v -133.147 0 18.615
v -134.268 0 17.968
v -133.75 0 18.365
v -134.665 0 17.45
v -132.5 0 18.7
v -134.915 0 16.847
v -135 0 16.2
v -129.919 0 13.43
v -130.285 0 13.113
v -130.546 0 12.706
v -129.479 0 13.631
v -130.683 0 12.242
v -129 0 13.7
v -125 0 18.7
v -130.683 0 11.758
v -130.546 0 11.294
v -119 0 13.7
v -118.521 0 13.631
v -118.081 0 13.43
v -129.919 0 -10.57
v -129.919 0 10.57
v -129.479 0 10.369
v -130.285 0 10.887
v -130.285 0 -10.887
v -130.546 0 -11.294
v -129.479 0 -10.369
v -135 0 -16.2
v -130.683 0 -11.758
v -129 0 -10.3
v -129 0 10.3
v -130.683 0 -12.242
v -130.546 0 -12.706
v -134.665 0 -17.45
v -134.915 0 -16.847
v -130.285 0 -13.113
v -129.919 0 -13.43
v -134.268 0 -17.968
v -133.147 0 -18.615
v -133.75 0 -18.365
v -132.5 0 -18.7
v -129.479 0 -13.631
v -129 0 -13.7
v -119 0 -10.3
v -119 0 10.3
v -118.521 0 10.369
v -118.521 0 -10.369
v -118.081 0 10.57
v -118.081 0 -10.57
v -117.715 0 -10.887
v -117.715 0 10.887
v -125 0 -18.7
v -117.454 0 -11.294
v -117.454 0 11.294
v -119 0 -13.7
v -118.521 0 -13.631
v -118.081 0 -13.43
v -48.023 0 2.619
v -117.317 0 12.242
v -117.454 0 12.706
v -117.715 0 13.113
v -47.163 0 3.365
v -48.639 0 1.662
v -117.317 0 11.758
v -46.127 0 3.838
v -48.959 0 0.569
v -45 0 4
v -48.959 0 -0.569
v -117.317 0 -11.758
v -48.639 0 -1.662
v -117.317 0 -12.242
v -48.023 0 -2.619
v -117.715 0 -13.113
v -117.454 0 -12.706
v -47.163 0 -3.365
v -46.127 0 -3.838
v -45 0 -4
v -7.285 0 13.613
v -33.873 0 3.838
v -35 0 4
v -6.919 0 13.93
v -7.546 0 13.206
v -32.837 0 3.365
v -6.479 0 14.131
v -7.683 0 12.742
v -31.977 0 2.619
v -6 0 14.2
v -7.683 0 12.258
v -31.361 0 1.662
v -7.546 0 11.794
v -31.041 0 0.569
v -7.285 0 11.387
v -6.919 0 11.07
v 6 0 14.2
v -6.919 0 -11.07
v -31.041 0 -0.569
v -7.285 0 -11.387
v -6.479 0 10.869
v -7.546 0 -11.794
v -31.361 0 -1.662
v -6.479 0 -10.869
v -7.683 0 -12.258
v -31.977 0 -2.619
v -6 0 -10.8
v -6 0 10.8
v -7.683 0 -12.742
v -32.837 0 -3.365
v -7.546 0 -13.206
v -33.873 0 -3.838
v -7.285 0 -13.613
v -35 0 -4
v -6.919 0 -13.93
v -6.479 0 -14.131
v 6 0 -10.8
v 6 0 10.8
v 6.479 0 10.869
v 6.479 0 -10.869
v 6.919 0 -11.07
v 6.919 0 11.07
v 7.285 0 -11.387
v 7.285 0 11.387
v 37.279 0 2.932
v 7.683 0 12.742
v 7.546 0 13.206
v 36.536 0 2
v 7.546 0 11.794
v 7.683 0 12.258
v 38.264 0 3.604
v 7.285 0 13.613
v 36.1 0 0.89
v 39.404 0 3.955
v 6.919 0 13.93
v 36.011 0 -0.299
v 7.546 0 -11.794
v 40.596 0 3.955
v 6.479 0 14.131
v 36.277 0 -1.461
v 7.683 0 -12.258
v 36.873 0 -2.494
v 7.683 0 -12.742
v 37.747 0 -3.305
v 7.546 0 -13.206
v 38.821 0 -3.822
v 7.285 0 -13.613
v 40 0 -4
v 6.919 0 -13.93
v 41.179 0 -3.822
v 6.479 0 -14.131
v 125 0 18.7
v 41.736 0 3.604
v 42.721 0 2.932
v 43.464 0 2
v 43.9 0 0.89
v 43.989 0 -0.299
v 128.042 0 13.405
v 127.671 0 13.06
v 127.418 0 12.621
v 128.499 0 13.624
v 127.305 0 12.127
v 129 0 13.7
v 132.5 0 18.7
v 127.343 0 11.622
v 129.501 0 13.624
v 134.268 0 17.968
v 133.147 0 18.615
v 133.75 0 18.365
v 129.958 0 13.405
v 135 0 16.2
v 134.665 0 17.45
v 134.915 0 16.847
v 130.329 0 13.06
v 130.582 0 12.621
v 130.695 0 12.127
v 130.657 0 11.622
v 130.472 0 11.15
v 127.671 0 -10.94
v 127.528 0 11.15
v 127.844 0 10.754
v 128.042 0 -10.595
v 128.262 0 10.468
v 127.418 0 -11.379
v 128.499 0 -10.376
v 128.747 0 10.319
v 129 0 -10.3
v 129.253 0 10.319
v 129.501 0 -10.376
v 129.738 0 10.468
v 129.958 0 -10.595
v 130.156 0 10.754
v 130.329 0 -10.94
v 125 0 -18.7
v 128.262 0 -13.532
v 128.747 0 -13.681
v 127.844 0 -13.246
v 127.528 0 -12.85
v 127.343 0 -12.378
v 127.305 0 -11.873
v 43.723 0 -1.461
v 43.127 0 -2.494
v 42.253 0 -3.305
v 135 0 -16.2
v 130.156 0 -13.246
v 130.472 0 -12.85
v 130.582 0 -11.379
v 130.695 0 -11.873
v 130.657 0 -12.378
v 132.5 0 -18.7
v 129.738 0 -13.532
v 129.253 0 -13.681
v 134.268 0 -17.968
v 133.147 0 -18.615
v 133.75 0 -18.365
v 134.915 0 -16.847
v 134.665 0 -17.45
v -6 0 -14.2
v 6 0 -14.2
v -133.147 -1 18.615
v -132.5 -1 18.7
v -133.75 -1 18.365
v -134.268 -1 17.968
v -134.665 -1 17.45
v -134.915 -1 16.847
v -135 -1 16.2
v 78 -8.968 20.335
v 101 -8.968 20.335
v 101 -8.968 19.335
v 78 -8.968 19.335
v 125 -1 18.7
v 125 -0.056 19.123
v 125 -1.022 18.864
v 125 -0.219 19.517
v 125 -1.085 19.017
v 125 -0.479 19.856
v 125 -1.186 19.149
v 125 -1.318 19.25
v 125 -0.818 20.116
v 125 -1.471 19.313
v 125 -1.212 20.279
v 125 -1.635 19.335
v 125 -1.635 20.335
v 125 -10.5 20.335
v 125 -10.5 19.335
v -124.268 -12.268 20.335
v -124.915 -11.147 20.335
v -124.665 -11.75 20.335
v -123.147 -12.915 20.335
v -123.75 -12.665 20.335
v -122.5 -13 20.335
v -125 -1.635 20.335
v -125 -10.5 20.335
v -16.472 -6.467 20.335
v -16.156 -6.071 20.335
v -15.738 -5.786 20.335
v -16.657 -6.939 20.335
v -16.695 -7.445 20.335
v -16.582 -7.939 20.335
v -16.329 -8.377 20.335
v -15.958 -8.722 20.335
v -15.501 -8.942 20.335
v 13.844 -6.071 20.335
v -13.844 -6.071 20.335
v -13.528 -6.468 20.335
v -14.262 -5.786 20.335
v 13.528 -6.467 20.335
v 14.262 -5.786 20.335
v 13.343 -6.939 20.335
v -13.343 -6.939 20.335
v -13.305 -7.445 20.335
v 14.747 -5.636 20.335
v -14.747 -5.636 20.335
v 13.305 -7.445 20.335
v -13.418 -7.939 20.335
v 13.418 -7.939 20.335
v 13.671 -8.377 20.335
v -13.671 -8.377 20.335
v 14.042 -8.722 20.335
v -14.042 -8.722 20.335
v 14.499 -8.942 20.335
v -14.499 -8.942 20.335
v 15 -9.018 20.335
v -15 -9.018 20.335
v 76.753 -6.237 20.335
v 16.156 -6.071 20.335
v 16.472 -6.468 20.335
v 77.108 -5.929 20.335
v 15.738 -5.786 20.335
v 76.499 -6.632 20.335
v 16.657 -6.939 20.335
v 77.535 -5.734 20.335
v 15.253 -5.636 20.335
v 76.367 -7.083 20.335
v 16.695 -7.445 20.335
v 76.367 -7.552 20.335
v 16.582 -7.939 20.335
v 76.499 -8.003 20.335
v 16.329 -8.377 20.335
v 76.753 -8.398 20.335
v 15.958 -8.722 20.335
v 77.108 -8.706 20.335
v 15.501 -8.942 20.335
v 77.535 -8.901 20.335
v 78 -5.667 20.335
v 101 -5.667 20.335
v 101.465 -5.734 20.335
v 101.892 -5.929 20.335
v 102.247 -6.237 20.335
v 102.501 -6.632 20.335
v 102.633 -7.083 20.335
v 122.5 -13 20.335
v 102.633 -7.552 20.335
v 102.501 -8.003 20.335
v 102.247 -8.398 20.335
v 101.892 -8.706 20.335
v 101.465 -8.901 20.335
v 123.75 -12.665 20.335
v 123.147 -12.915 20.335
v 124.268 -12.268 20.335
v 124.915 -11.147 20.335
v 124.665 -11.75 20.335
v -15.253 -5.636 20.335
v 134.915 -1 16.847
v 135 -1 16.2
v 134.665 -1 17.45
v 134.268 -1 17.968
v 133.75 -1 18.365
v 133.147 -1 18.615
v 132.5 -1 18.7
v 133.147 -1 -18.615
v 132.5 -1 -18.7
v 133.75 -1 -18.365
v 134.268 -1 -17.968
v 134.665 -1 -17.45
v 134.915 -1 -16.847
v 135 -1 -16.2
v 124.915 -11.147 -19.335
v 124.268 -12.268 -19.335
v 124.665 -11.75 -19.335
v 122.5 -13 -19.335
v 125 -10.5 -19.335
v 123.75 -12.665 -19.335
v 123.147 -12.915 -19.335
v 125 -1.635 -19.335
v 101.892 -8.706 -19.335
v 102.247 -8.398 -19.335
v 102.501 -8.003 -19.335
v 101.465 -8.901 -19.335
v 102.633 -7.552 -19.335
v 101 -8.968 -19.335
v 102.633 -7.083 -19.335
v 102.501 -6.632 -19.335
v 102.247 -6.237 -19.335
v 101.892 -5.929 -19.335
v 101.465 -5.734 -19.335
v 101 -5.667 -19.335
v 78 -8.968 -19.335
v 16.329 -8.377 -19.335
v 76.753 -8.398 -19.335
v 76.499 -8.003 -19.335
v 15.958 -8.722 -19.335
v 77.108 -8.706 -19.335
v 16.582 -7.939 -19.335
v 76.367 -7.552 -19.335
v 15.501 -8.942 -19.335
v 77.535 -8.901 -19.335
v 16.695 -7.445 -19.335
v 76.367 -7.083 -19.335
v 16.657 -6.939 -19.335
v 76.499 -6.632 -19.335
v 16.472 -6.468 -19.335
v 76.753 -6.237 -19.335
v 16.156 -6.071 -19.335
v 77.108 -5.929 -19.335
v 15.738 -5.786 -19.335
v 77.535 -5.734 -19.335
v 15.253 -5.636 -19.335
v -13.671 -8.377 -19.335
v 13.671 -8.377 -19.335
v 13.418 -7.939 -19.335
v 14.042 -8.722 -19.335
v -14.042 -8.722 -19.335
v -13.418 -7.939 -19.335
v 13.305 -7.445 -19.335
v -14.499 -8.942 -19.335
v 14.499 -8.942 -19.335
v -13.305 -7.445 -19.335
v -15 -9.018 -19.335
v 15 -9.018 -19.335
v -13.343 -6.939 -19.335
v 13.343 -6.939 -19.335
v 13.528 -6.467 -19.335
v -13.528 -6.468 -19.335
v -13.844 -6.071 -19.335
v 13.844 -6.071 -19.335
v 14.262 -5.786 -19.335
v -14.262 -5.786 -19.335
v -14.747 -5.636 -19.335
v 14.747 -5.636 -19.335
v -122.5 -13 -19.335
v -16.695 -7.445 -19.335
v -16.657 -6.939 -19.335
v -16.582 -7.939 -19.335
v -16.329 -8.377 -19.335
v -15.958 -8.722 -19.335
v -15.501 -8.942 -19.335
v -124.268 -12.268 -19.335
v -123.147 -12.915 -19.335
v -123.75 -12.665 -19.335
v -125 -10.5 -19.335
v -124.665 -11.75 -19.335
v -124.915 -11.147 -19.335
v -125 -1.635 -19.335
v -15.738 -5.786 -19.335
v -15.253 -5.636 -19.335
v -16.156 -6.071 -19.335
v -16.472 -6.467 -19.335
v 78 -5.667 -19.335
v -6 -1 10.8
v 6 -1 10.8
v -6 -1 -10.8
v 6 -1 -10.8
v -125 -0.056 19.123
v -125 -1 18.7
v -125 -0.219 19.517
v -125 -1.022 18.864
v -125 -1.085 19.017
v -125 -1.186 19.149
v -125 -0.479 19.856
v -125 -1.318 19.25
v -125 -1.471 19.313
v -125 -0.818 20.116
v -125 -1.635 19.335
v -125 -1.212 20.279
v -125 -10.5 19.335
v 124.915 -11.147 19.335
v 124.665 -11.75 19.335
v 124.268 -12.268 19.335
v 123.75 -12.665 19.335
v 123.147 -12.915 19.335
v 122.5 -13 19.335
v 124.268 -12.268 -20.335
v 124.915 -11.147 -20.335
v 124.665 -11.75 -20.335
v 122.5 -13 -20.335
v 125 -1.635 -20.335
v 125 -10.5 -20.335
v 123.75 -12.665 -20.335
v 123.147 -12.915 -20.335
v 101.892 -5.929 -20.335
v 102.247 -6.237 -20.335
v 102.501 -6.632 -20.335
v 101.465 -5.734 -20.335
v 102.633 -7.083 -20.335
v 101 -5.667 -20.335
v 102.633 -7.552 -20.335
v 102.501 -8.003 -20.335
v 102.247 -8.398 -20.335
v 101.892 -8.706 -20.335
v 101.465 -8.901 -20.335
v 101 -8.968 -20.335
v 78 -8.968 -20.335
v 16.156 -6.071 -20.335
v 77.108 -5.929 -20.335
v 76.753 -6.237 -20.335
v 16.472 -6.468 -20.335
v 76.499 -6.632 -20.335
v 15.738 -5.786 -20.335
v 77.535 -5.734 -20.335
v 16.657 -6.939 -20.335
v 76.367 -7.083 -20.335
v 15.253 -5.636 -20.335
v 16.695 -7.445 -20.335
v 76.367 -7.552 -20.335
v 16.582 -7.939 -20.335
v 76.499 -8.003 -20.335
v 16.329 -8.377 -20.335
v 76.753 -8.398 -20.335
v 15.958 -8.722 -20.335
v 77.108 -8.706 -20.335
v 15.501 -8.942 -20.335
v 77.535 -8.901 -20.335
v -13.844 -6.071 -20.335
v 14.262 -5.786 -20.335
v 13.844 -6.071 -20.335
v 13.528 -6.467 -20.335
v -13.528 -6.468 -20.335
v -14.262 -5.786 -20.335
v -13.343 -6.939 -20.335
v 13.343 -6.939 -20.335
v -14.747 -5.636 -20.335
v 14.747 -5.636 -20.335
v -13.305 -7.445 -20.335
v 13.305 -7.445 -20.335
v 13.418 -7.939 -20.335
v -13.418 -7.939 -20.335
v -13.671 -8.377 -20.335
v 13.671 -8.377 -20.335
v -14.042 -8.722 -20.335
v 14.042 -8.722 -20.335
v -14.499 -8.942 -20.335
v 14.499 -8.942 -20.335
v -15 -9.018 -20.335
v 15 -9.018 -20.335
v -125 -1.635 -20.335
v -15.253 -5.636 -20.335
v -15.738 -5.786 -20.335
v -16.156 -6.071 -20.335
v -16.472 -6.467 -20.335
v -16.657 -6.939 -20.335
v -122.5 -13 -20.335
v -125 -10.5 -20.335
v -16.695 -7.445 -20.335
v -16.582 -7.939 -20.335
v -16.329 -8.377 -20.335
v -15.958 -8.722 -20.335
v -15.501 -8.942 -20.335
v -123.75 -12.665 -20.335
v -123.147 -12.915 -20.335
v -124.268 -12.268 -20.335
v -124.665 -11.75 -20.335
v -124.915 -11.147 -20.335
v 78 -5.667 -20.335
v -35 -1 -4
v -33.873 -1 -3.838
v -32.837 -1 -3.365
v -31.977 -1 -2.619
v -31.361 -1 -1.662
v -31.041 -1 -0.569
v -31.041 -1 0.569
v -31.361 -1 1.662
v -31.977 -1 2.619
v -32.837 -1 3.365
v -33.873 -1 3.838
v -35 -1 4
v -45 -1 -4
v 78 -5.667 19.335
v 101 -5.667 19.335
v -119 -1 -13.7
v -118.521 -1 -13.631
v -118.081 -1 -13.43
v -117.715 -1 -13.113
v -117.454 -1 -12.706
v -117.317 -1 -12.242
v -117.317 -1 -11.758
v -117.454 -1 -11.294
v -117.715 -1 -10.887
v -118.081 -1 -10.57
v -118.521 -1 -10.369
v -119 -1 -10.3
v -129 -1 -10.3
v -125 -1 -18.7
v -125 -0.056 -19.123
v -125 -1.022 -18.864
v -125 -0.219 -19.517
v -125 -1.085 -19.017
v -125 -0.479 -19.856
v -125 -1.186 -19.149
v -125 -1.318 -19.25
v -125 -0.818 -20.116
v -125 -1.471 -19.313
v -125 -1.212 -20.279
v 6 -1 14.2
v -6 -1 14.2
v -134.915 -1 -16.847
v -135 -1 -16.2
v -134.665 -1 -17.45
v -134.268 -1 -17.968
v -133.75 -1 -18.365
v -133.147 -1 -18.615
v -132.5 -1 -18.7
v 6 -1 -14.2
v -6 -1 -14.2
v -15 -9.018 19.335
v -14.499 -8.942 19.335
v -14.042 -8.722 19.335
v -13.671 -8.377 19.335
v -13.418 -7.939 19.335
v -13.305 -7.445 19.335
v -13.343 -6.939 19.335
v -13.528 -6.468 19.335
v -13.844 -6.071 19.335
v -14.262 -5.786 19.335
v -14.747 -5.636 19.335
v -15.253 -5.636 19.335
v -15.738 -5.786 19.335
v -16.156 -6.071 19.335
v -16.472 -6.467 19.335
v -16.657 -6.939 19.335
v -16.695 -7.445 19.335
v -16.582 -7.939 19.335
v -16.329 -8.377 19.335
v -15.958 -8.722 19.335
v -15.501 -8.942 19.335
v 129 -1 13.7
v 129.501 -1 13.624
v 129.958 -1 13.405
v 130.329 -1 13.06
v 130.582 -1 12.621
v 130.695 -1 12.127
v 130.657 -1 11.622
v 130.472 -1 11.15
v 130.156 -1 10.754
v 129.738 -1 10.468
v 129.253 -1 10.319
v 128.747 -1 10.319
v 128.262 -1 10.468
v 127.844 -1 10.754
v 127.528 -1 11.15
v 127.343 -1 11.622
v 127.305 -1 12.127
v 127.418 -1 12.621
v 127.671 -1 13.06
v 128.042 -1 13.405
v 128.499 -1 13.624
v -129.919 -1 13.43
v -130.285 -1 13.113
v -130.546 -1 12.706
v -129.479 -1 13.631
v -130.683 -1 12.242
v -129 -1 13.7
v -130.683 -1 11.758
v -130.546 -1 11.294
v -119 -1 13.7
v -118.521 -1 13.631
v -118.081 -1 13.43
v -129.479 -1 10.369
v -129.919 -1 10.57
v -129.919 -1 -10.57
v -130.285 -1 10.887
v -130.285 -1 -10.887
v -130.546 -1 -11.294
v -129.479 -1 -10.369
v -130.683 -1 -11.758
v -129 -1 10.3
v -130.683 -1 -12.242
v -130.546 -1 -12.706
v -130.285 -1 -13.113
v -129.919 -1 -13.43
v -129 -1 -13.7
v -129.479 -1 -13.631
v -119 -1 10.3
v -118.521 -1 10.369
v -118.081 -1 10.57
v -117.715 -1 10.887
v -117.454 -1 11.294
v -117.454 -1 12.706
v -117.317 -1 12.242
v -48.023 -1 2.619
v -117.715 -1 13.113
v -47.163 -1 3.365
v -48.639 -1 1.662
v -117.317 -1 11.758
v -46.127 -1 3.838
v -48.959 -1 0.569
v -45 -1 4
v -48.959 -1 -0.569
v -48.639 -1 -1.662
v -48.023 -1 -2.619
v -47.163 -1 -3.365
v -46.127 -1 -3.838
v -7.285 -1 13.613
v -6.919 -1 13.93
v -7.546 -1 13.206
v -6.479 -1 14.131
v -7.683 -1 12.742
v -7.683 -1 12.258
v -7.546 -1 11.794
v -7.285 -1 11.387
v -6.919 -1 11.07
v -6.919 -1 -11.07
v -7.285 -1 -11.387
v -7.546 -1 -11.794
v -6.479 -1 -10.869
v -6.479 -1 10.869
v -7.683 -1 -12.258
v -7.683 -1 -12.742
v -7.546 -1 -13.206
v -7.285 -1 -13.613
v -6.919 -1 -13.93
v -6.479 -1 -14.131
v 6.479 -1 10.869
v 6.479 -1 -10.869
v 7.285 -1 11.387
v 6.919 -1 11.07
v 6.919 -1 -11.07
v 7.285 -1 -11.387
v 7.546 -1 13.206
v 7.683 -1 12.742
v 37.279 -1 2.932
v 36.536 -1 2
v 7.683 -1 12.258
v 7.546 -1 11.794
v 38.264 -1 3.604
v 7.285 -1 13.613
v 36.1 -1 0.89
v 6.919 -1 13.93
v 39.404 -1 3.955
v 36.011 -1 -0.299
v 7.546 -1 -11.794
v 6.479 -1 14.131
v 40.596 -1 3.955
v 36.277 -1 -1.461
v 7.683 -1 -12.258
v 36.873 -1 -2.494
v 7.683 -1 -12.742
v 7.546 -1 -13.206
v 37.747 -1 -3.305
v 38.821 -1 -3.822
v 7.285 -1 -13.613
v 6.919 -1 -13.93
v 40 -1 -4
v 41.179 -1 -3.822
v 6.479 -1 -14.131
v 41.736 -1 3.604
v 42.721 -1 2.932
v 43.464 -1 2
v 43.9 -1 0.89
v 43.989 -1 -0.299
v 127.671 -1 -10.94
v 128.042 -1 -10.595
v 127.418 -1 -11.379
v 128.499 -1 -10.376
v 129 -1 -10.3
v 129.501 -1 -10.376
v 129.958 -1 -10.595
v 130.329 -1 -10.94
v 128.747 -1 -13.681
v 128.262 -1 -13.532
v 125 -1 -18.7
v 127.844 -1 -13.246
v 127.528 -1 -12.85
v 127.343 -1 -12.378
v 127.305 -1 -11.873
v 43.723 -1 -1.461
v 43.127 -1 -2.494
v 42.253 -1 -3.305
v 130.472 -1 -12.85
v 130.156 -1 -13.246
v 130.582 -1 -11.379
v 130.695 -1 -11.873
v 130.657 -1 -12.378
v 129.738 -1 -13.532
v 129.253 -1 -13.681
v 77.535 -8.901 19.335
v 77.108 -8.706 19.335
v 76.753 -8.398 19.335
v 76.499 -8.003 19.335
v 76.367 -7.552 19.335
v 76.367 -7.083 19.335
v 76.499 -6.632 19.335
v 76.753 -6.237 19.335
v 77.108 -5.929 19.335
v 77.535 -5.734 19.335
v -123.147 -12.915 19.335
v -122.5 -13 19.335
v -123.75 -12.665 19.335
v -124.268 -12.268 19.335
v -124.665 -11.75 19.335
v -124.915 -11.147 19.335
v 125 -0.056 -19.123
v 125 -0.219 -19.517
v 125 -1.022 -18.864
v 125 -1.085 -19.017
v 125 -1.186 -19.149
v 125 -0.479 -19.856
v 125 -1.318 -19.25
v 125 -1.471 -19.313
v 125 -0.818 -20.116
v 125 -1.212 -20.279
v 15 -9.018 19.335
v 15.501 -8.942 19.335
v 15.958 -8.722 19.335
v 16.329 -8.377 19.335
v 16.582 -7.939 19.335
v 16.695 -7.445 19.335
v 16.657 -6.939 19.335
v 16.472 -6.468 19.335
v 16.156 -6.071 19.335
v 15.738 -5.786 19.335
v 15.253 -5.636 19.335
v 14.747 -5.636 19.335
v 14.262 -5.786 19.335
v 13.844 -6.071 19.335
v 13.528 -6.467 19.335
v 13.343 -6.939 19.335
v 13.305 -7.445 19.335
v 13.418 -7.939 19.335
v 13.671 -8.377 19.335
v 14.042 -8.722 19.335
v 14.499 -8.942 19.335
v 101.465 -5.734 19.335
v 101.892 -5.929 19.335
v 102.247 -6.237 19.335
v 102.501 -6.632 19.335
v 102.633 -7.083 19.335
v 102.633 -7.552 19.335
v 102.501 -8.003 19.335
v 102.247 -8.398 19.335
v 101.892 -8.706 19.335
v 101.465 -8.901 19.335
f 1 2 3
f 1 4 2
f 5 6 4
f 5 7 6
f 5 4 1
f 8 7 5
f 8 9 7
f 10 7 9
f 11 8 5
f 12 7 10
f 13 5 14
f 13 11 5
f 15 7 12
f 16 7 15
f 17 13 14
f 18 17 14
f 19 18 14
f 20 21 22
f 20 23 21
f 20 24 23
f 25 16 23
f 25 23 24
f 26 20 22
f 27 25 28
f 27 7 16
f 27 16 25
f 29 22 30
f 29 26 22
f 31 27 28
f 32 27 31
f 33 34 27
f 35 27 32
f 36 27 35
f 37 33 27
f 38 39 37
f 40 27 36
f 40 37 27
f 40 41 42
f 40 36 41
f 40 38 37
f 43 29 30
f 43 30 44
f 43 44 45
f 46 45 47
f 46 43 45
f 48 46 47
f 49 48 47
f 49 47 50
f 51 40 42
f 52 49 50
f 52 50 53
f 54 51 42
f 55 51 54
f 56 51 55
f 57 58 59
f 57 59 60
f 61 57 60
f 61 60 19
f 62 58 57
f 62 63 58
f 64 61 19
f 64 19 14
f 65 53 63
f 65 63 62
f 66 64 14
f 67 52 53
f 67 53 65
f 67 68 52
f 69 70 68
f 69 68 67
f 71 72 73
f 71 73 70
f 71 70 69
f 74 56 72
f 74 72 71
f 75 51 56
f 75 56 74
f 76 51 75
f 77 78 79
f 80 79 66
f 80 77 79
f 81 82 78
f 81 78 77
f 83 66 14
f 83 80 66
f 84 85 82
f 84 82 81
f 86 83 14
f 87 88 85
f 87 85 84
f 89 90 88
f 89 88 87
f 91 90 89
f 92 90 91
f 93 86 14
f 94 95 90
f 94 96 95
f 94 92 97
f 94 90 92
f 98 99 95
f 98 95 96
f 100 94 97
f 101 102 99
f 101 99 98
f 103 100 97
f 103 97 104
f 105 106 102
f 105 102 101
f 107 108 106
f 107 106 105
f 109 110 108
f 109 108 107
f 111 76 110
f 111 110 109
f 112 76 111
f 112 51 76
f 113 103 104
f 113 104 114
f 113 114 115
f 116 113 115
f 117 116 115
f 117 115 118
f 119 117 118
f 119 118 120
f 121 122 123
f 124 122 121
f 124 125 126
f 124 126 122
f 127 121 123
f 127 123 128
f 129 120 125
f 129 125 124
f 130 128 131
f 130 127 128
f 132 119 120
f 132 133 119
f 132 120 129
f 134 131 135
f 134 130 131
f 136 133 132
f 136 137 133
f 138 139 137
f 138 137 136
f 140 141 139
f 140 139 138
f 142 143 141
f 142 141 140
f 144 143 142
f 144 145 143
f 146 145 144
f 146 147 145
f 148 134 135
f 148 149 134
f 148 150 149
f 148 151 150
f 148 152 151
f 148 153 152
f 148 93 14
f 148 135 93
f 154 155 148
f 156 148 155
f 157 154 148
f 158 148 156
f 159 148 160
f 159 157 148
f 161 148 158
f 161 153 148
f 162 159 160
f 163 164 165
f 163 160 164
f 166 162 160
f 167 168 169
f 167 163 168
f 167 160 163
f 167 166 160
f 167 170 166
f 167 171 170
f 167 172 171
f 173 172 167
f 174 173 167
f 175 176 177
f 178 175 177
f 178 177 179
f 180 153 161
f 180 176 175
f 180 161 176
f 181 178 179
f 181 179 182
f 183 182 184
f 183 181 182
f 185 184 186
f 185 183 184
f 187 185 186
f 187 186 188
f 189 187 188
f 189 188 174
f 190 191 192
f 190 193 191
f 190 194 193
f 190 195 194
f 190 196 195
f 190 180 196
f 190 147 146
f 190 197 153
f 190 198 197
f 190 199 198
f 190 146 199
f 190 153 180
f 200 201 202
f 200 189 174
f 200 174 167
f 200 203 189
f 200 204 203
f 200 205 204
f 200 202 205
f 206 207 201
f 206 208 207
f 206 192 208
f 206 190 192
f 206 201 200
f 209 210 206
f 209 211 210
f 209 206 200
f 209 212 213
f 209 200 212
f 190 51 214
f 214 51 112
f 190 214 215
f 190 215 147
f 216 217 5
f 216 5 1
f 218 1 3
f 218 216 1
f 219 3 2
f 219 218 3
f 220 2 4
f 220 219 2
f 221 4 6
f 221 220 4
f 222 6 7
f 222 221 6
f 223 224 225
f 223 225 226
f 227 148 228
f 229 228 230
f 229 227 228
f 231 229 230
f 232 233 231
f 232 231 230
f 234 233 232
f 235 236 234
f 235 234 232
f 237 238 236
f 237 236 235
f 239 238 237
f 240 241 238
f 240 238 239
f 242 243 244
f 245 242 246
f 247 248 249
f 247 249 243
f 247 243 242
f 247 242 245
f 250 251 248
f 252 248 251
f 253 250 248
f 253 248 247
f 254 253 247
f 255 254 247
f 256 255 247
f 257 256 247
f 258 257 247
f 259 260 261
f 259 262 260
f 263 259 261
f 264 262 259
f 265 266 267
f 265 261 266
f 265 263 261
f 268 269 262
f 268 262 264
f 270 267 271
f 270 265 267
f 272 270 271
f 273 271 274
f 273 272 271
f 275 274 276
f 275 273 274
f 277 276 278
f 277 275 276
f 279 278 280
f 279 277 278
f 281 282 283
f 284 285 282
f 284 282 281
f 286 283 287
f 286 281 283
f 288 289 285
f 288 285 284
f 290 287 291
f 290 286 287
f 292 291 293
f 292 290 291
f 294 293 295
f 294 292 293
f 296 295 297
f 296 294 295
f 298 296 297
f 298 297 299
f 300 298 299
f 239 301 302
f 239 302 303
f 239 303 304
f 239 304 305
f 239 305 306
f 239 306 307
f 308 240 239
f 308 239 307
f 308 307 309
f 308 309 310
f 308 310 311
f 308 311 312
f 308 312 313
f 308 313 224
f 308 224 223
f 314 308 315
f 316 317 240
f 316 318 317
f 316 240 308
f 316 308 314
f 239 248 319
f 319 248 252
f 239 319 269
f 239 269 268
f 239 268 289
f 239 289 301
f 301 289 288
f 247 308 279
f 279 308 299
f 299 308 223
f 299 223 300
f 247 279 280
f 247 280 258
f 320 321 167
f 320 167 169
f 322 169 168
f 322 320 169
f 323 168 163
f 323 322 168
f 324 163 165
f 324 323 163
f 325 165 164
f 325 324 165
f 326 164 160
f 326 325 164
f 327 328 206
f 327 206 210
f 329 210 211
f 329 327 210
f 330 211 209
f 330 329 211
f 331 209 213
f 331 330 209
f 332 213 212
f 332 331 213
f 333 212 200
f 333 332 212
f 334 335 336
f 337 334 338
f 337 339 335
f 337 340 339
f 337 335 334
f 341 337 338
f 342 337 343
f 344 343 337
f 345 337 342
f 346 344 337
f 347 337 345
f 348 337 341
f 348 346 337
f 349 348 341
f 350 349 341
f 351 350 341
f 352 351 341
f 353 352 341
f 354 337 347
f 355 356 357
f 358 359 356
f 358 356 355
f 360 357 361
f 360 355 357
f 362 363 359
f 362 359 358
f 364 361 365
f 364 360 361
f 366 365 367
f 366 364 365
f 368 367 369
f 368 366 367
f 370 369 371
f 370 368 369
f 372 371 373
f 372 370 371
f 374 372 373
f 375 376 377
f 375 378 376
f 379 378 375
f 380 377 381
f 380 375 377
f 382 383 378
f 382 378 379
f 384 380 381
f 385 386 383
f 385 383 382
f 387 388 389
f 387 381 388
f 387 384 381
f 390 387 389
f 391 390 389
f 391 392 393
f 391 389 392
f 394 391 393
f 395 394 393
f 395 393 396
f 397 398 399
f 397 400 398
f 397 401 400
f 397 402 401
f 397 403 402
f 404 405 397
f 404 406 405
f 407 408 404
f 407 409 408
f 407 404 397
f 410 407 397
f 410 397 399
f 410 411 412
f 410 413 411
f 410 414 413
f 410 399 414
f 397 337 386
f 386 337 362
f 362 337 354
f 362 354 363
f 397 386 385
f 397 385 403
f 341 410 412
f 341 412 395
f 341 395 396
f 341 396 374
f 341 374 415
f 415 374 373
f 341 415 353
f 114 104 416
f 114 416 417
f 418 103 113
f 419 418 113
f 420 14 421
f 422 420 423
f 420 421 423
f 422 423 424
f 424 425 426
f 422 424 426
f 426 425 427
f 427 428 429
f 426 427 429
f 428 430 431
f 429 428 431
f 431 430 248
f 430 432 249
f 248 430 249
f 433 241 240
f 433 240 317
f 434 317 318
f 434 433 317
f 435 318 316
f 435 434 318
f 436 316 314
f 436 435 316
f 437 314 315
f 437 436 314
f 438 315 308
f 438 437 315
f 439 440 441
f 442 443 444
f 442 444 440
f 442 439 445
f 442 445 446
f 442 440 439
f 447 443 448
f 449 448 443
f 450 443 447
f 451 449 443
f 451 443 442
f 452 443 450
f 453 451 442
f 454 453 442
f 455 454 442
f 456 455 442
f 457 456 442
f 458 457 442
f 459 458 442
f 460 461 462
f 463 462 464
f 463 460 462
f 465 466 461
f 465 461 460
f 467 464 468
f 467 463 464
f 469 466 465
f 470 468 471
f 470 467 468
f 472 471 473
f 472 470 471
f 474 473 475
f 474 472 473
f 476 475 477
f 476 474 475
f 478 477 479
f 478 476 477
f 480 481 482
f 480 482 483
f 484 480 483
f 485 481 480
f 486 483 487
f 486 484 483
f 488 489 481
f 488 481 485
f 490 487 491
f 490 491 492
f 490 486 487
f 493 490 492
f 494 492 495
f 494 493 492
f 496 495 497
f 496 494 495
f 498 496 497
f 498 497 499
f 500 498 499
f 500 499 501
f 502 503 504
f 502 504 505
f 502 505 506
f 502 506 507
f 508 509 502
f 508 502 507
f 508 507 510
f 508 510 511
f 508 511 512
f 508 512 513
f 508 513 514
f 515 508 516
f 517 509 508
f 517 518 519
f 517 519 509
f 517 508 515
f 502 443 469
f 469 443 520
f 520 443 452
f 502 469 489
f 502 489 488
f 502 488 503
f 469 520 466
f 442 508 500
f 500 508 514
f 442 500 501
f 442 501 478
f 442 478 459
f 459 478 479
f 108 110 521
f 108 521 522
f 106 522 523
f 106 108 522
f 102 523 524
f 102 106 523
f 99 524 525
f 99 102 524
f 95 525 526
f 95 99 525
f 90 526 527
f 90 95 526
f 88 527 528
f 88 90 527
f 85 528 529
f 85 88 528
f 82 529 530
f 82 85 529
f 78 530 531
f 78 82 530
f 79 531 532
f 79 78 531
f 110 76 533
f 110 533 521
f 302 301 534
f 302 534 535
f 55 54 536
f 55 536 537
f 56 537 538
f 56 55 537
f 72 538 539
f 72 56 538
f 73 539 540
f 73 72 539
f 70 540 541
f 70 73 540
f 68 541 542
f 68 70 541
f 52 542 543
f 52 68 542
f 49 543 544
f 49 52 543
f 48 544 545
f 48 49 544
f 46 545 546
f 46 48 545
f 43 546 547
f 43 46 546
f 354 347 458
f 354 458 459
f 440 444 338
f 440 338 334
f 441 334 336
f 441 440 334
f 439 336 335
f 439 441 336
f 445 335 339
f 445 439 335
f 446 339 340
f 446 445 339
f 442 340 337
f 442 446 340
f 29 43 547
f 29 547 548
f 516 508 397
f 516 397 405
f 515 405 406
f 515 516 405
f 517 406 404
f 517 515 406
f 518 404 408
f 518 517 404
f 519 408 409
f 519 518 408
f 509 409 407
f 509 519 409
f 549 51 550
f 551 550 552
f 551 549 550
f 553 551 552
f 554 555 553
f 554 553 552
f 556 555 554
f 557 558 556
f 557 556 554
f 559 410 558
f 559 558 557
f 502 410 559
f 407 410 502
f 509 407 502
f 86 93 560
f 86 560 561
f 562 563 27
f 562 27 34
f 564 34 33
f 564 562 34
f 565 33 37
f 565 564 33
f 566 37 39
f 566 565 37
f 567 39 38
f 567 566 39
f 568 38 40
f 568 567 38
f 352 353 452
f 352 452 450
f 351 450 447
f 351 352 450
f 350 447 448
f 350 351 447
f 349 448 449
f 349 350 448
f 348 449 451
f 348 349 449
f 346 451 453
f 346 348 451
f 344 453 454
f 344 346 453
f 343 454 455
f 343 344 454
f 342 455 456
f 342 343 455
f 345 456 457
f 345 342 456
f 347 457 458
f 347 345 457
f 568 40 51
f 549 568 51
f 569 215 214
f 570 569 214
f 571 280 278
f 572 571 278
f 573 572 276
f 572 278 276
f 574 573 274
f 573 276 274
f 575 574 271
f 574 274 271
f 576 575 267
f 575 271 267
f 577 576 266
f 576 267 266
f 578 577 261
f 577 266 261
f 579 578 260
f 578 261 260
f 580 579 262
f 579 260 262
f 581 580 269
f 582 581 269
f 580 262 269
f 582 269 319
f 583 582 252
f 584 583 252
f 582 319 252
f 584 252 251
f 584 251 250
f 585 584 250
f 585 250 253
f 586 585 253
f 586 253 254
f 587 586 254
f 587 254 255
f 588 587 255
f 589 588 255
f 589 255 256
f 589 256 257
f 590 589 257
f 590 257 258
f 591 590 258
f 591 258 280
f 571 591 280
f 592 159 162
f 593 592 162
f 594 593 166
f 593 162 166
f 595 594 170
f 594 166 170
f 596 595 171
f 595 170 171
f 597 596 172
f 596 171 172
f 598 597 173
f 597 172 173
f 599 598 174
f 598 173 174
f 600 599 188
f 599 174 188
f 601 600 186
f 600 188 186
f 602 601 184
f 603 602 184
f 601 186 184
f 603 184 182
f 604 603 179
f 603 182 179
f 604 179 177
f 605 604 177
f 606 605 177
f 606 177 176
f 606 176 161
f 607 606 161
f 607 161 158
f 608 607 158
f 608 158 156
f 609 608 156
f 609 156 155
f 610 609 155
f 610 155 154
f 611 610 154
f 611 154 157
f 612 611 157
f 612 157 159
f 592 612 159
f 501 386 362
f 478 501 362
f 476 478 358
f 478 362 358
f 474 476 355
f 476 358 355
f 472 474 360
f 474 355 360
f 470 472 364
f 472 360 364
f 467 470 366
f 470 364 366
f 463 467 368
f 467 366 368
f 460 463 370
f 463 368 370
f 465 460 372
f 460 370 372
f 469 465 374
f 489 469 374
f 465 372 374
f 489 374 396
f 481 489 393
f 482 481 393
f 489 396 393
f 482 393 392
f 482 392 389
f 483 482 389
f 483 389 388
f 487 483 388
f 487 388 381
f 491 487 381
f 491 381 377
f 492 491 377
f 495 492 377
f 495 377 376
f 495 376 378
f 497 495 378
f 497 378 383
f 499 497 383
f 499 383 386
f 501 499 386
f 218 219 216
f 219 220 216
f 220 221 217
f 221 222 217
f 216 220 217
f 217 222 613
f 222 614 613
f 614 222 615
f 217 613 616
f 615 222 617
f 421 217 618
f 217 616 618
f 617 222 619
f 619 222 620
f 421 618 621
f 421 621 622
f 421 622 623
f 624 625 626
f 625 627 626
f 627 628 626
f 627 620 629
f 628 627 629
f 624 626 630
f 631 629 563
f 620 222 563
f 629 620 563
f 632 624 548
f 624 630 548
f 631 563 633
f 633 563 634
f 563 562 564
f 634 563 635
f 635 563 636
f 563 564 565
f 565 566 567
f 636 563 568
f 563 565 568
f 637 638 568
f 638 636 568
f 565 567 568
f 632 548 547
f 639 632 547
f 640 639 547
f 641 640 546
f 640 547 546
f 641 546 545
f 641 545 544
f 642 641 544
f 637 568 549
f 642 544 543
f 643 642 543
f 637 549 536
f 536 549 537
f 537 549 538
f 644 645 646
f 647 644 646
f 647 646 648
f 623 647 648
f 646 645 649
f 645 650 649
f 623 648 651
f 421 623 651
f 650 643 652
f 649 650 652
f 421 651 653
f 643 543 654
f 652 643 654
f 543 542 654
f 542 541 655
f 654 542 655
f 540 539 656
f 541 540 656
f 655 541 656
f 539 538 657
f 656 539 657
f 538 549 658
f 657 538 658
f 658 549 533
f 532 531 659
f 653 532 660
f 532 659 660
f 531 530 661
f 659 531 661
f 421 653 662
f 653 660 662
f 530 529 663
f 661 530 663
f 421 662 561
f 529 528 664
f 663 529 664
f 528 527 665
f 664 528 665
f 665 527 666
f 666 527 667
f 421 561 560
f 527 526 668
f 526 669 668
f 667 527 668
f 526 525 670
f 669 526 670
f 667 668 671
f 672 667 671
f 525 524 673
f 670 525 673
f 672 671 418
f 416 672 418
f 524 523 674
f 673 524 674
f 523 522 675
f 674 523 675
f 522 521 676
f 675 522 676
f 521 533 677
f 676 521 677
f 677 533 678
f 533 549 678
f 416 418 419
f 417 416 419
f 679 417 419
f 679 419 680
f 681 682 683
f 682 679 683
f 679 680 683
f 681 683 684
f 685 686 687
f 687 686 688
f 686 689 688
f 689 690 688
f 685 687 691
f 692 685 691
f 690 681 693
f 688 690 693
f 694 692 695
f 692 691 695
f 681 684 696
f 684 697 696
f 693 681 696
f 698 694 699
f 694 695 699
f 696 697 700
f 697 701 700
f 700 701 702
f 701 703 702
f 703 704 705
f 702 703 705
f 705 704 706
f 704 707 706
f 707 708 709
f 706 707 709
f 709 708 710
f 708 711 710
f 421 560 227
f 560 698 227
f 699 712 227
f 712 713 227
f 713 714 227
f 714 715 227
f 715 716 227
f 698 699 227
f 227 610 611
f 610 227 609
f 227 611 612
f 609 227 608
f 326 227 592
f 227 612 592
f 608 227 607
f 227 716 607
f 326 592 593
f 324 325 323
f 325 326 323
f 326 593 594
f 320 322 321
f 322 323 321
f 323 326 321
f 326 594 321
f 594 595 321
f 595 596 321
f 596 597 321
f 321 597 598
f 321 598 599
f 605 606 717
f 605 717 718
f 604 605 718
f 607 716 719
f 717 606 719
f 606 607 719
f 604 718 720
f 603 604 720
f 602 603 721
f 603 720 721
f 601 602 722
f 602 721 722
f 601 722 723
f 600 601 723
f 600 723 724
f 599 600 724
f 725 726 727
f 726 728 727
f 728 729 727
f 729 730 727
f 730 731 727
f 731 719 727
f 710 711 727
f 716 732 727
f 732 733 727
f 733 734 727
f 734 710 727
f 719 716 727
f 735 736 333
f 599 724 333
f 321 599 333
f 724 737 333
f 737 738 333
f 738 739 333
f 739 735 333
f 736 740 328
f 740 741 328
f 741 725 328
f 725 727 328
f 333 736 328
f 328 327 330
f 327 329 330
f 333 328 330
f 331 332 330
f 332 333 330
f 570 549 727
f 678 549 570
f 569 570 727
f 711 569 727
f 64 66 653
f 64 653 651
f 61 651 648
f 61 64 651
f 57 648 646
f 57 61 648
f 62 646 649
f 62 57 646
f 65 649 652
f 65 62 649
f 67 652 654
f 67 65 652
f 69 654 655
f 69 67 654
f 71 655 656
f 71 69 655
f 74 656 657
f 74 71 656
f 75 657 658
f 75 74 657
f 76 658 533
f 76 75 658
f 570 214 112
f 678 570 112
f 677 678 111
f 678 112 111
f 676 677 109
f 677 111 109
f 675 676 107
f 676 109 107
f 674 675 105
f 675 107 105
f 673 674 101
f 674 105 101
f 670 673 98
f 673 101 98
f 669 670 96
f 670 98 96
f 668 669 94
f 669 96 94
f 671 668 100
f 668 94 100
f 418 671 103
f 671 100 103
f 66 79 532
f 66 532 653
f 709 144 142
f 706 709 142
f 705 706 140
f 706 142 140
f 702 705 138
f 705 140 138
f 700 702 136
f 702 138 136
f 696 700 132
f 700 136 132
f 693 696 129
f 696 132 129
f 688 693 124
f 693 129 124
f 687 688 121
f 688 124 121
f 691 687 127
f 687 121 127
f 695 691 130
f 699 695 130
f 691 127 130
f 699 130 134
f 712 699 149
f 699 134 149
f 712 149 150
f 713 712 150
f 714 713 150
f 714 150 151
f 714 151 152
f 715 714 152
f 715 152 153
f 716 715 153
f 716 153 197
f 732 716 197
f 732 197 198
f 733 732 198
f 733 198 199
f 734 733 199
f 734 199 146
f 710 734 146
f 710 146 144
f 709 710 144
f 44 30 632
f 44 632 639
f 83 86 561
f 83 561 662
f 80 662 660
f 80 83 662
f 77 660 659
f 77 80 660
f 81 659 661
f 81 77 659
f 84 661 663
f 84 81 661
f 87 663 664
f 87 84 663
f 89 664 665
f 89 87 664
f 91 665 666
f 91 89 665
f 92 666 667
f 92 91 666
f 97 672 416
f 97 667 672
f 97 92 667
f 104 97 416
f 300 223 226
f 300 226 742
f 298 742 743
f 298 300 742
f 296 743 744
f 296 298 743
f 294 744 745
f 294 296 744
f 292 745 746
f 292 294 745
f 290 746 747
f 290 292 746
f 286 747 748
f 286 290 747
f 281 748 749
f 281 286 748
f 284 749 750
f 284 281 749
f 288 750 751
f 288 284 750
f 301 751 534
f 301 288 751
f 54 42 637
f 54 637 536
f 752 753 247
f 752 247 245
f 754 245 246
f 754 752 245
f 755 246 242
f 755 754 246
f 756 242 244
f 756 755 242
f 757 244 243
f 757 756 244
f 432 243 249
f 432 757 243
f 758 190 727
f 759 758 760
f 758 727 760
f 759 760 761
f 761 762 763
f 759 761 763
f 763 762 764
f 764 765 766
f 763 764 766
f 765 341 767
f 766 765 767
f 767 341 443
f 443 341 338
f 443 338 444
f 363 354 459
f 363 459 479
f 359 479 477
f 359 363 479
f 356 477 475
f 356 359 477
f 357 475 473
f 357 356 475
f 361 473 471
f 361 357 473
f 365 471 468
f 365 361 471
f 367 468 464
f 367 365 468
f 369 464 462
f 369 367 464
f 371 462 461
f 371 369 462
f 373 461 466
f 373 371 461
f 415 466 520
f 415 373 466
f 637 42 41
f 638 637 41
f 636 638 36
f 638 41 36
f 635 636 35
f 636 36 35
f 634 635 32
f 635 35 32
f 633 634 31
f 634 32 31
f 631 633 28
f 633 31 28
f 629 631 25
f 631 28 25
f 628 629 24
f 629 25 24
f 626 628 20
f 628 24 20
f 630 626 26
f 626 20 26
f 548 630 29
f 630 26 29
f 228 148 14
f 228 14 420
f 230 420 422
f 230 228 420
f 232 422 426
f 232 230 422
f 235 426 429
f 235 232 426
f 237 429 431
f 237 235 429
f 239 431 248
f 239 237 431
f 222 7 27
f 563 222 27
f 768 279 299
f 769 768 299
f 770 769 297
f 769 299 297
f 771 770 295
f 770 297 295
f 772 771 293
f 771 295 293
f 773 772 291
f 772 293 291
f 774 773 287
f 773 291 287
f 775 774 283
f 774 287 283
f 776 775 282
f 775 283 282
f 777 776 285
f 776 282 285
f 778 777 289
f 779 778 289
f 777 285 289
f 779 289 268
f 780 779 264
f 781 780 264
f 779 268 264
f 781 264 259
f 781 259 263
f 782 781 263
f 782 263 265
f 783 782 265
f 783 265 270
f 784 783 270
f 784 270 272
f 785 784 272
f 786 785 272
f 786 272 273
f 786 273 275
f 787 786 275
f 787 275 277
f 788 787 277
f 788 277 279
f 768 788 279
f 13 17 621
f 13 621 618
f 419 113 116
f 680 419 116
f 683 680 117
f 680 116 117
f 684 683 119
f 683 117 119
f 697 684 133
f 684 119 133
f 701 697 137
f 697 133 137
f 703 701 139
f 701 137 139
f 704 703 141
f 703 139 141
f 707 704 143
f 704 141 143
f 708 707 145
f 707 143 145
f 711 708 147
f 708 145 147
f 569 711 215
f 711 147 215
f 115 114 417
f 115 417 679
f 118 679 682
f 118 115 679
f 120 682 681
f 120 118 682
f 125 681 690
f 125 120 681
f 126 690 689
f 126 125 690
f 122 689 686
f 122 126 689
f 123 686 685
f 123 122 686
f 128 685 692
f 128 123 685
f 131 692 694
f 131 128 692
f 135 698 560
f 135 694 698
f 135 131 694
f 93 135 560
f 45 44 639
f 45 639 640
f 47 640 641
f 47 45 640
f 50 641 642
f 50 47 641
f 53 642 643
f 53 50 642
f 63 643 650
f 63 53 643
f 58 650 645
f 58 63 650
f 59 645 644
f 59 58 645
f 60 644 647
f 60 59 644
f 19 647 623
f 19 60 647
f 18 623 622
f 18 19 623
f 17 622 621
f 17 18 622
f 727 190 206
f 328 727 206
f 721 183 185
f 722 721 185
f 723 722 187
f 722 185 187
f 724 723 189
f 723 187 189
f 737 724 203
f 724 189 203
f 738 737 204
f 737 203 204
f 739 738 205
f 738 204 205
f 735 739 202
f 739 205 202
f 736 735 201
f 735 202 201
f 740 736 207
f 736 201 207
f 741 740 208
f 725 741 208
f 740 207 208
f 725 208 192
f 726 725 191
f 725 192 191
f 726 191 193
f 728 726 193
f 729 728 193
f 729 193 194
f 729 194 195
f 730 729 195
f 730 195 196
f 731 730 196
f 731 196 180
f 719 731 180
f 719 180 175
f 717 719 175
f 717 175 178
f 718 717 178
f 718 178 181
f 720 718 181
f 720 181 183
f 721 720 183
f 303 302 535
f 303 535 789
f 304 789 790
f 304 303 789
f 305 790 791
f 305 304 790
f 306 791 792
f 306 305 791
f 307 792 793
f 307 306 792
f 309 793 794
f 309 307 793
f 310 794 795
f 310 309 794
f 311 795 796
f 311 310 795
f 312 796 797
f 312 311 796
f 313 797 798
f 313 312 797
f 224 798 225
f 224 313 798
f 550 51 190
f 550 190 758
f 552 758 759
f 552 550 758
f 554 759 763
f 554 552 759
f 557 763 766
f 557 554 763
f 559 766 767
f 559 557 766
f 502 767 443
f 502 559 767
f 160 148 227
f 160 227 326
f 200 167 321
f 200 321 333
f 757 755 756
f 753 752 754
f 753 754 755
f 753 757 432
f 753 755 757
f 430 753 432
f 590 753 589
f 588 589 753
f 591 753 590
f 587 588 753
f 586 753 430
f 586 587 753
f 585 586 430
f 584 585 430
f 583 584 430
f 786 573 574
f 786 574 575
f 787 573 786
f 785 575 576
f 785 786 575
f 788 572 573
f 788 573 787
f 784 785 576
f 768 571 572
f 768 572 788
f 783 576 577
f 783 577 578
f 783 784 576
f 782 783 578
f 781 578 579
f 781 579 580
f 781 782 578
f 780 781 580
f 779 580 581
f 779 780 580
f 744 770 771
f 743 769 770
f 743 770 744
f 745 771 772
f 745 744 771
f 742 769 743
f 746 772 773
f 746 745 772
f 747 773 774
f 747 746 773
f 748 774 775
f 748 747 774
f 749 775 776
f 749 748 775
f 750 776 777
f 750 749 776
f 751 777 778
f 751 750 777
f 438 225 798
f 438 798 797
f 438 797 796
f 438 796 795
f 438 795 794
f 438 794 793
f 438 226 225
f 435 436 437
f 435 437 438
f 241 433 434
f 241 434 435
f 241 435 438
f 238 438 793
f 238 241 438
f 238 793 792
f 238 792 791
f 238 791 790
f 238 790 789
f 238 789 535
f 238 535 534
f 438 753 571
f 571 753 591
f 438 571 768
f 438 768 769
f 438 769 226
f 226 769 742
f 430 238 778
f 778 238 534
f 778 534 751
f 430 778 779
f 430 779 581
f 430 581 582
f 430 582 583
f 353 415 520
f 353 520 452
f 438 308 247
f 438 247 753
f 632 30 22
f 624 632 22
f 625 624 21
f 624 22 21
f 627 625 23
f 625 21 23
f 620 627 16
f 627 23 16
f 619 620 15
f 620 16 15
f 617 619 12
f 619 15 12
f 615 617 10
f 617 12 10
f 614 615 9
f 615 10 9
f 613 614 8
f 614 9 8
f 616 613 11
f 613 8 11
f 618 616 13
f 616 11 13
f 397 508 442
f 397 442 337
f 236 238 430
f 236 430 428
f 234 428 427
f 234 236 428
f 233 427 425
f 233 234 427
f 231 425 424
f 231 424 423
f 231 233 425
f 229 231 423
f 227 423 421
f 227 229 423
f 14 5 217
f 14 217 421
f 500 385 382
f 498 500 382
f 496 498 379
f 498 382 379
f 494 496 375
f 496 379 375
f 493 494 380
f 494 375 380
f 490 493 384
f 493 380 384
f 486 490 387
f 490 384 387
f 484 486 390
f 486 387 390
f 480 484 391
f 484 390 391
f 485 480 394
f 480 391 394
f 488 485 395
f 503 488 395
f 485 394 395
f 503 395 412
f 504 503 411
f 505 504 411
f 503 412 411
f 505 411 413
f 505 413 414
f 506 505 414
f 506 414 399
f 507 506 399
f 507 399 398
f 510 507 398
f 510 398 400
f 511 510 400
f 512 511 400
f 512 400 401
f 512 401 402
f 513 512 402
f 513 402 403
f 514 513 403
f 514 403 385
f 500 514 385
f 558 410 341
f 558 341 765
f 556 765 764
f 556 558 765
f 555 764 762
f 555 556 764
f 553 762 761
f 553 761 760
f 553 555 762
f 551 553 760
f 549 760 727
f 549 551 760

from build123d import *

# Parameters (mm, degrees)
SKETCH1_W               = 270
SKETCH1_H               = 37.4
BASE_FLANGE1_DEPTH      = 1
SKETCH4_R               = 4
CUT_EXTRUDE1_DEPTH      = 137.292663045
CUT_EXTRUDE2_DEPTH      = 1
EDGE_FLANGE1_DEPTH      = 250
EDGE_FLANGE1_BEND_DEPTH = 250
CUT_EXTRUDE3_REACH      = 139.14
SKETCH13_R              = 1.7
CUT_EXTRUDE4_DEPTH      = 142.591132844
BREAK_CORNER1_START     = -20.335
BREAK_CORNER1_DEPTH     = 40.67
BREAK_CORNER1_START_2   = -1
BREAK_CORNER1_2_DEPTH   = 1
CUT_EXTRUDE5_REACH      = 139.14
SKETCH16_R              = 1.7
CUT_EXTRUDE6_DEPTH      = 142.591132844
CUT_EXTRUDE7_DEPTH      = 1


# Read off the part's stored shape, not the designer's step: Break-Corner1
# Sheet-metal steps are written as plain solids
with BuildPart() as part:
    # Sketch1 → Base-Flange1 (new body)
    with BuildSketch(Plane(origin=(0, 0, 0), x_dir=(1, 0, 0), z_dir=(0, 1, 0))):
        Rectangle(SKETCH1_W, SKETCH1_H)
    extrude(amount=-BASE_FLANGE1_DEPTH)

    # Sketch4 → Cut-Extrude1 (cut, through all)
    with BuildSketch(Plane(origin=(0, 0, 0), x_dir=(1, 0, 0), z_dir=(0, 1, 0))):
        with Locations(Location((-40, 0, 0), (0, 0, 270))):
            Circle(SKETCH4_R)
        with Locations(Location((40, 0, 0), (0, 0, 90))):
            Circle(SKETCH4_R)
    extrude(amount=-CUT_EXTRUDE1_DEPTH, mode=Mode.SUBTRACT)

    # Sketch6 → Cut-Extrude2 (cut)
    with BuildSketch(Plane(origin=(0, 0, 0), x_dir=(1, 0, 0), z_dir=(0, 1, 0))):
        with BuildLine():
            Line((-45, 4), (-35, 4))
            ThreePointArc((-35, 4), (-31, 0), (-35, -4))
            Line((-35, -4), (-45, -4))
            ThreePointArc((-45, -4), (-49, 0), (-45, 4))
        make_face()
    extrude(amount=-CUT_EXTRUDE2_DEPTH, mode=Mode.SUBTRACT)

    # Edge-Flange1 section (across the edge) → Edge-Flange1 (add)
    with BuildSketch(Plane(origin=(125, -1, 19.335), x_dir=(0, 0, -1), z_dir=(-1, 0, 0))):
        with BuildLine():
            Line((-1, 0.635), (-1, 12))
            Line((-1, 12), (0, 12))
            Line((0, 12), (0, 0.635))
            ThreePointArc((0, 0.635), (0.185987194, 0.185987194), (0.635, 0))
            Line((0.635, 0), (0.635, -1))
            ThreePointArc((0.635, -1), (-0.521119587, -0.521119587), (-1, 0.635))
        make_face()
    extrude(amount=EDGE_FLANGE1_DEPTH)

    # Edge-Flange1 section 2 (across the edge) → Edge-Flange1 bend (add)
    with BuildSketch(Plane(origin=(-125, -1, -19.335), x_dir=(0, 0, 1), z_dir=(1, 0, 0))):
        with BuildLine():
            Line((-1, 0.635), (-1, 12))
            Line((-1, 12), (0, 12))
            Line((0, 12), (0, 0.635))
            ThreePointArc((0, 0.635), (0.185987194, 0.185987194), (0.635, 0))
            Line((0.635, 0), (0.635, -1))
            ThreePointArc((0.635, -1), (-0.521119587, -0.521119587), (-1, 0.635))
        make_face()
    extrude(amount=EDGE_FLANGE1_BEND_DEPTH)

    # Sketch13 → Cut-Extrude3 (cut, up to next)
    with BuildSketch(Plane(origin=(0, 0, 0), x_dir=(1, 0, 0), z_dir=(0, 1, 0)), mode=Mode.PRIVATE) as cut_extrude3_sk1:
        with Locations(Location((-129, 12, 0), (0, 0, 270))):
            Circle(SKETCH13_R)
    cut_extrude3_tool1 = extrude(cut_extrude3_sk1.sketch, amount=-CUT_EXTRUDE3_REACH, mode=Mode.PRIVATE) & part.part
    # Sketch13 → Cut-Extrude3 (cut, up to next)
    with BuildSketch(Plane(origin=(0, 0, 0), x_dir=(1, 0, 0), z_dir=(0, 1, 0)), mode=Mode.PRIVATE) as cut_extrude3_sk2:
        with Locations(Location((-129, -12, 0), (0, 0, 270))):
            Circle(SKETCH13_R)
    cut_extrude3_tool2 = extrude(cut_extrude3_sk2.sketch, amount=-CUT_EXTRUDE3_REACH, mode=Mode.PRIVATE) & part.part
    # Sketch13 → Cut-Extrude3 (cut, up to next)
    with BuildSketch(Plane(origin=(0, 0, 0), x_dir=(1, 0, 0), z_dir=(0, 1, 0)), mode=Mode.PRIVATE) as cut_extrude3_sk3:
        with Locations(Location((129, -12, 0), (0, 0, 270))):
            Circle(SKETCH13_R)
    cut_extrude3_tool3 = extrude(cut_extrude3_sk3.sketch, amount=-CUT_EXTRUDE3_REACH, mode=Mode.PRIVATE) & part.part
    # Sketch13 → Cut-Extrude3 (cut, up to next)
    with BuildSketch(Plane(origin=(0, 0, 0), x_dir=(1, 0, 0), z_dir=(0, 1, 0)), mode=Mode.PRIVATE) as cut_extrude3_sk4:
        with Locations(Location((129, 12, 0), (0, 0, 270))):
            Circle(SKETCH13_R)
    cut_extrude3_tool4 = extrude(cut_extrude3_sk4.sketch, amount=-CUT_EXTRUDE3_REACH, mode=Mode.PRIVATE) & part.part
    add(cut_extrude3_tool1.solids().sort_by_distance((-129, 0, -12))[0], mode=Mode.SUBTRACT)
    add(cut_extrude3_tool2.solids().sort_by_distance((-129, 0, 12))[0], mode=Mode.SUBTRACT)
    add(cut_extrude3_tool3.solids().sort_by_distance((129, 0, 12))[0], mode=Mode.SUBTRACT)
    add(cut_extrude3_tool4.solids().sort_by_distance((129, 0, -12))[0], mode=Mode.SUBTRACT)

    # Sketch14 → Cut-Extrude4 (cut, through all)
    with BuildSketch(Plane.XY.offset(20.335)):
        with BuildLine():
            Line((78, -5.6675), (101, -5.6675))
            ThreePointArc((101, -5.6675), (102.65, -7.3175), (101, -8.9675))
            Line((101, -8.9675), (78, -8.9675))
            ThreePointArc((78, -8.9675), (76.35, -7.3175), (78, -5.6675))
        make_face()
    extrude(amount=-CUT_EXTRUDE4_DEPTH, mode=Mode.SUBTRACT)

    # Break-Corner1 outline → Break-Corner1 (cut)
    with BuildSketch(Plane.XY.offset(BREAK_CORNER1_START)):
        with BuildLine():
            Line((-125, -13), (-122.5, -13))
            ThreePointArc((-122.5, -13), (-124.267766953, -12.267766953), (-125, -10.5))
            Line((-125, -10.5), (-125, -13))
        make_face()
        with BuildLine():
            ThreePointArc((125, -10.5), (124.267766953, -12.267766953), (122.5, -13))
            Line((122.5, -13), (125, -13))
            Line((125, -13), (125, -10.5))
        make_face()
    extrude(amount=BREAK_CORNER1_DEPTH, mode=Mode.SUBTRACT)

    # Break-Corner1 2 outline → Break-Corner1 2 (cut)
    with BuildSketch(Plane(origin=(0, 0, 0), x_dir=(1, 0, 0), z_dir=(0, 1, 0)).offset(BREAK_CORNER1_START_2)):
        with BuildLine():
            ThreePointArc((132.5, 18.7), (134.267766953, 17.967766953), (135, 16.2))
            Line((135, 16.2), (135, 18.7))
            Line((135, 18.7), (132.5, 18.7))
        make_face()
        with BuildLine():
            ThreePointArc((135, -16.2), (134.267766953, -17.967766953), (132.5, -18.7))
            Line((132.5, -18.7), (135, -18.7))
            Line((135, -18.7), (135, -16.2))
        make_face()
        with BuildLine():
            Line((-135, 18.7), (-135, 16.2))
            ThreePointArc((-135, 16.2), (-134.267766953, 17.967766953), (-132.5, 18.7))
            Line((-132.5, 18.7), (-135, 18.7))
        make_face()
        with BuildLine():
            ThreePointArc((-132.5, -18.7), (-134.267766953, -17.967766953), (-135, -16.2))
            Line((-135, -16.2), (-135, -18.7))
            Line((-135, -18.7), (-132.5, -18.7))
        make_face()
    extrude(amount=BREAK_CORNER1_2_DEPTH, mode=Mode.SUBTRACT)

    # Sketch15 → Cut-Extrude5 (cut, up to next)
    with BuildSketch(Plane(origin=(0, 0, 0), x_dir=(1, 0, 0), z_dir=(0, 1, 0)), mode=Mode.PRIVATE) as cut_extrude5_sk1:
        with BuildLine():
            Line((-6, -10.8), (6, -10.8))
            ThreePointArc((6, -10.8), (7.7, -12.5), (6, -14.2))
            Line((6, -14.2), (-6, -14.2))
            ThreePointArc((-6, -14.2), (-7.7, -12.5), (-6, -10.8))
        make_face()
    cut_extrude5_tool1 = extrude(cut_extrude5_sk1.sketch, amount=-CUT_EXTRUDE5_REACH, mode=Mode.PRIVATE) & part.part
    # Sketch15 → Cut-Extrude5 (cut, up to next)
    with BuildSketch(Plane(origin=(0, 0, 0), x_dir=(1, 0, 0), z_dir=(0, 1, 0)), mode=Mode.PRIVATE) as cut_extrude5_sk2:
        with BuildLine():
            Line((-6, 10.8), (6, 10.8))
            ThreePointArc((6, 10.8), (7.7, 12.5), (6, 14.2))
            Line((6, 14.2), (-6, 14.2))
            ThreePointArc((-6, 14.2), (-7.7, 12.5), (-6, 10.8))
        make_face()
    cut_extrude5_tool2 = extrude(cut_extrude5_sk2.sketch, amount=-CUT_EXTRUDE5_REACH, mode=Mode.PRIVATE) & part.part
    add(cut_extrude5_tool1.solids().sort_by_distance((0, 0, 12.5))[0], mode=Mode.SUBTRACT)
    add(cut_extrude5_tool2.solids().sort_by_distance((0, 0, -12.5))[0], mode=Mode.SUBTRACT)

    # Sketch16 → Cut-Extrude6 (cut, through all)
    with BuildSketch(Plane.XY.offset(20.335)):
        with Locations(Location((15, -7.3175, 0), (0, 0, 270))):
            Circle(SKETCH16_R)
        with Locations(Location((-15, -7.3175, 0), (0, 0, 270))):
            Circle(SKETCH16_R)
    extrude(amount=-CUT_EXTRUDE6_DEPTH, mode=Mode.SUBTRACT)

    # Sketch17 → Cut-Extrude7 (cut)
    with BuildSketch(Plane(origin=(0, 0, 0), x_dir=(1, 0, 0), z_dir=(0, 1, 0))):
        with BuildLine():
            Line((-129, -10.3), (-119, -10.3))
            ThreePointArc((-119, -10.3), (-117.3, -12), (-119, -13.7))
            Line((-119, -13.7), (-129, -13.7))
            ThreePointArc((-129, -13.7), (-130.7, -12), (-129, -10.3))
        make_face()
        with BuildLine():
            Line((-129, 13.7), (-119, 13.7))
            ThreePointArc((-119, 13.7), (-117.3, 12), (-119, 10.3))
            Line((-119, 10.3), (-129, 10.3))
            ThreePointArc((-129, 10.3), (-130.7, 12), (-129, 13.7))
        make_face()
    extrude(amount=-CUT_EXTRUDE7_DEPTH, mode=Mode.SUBTRACT)


solid = part.part
